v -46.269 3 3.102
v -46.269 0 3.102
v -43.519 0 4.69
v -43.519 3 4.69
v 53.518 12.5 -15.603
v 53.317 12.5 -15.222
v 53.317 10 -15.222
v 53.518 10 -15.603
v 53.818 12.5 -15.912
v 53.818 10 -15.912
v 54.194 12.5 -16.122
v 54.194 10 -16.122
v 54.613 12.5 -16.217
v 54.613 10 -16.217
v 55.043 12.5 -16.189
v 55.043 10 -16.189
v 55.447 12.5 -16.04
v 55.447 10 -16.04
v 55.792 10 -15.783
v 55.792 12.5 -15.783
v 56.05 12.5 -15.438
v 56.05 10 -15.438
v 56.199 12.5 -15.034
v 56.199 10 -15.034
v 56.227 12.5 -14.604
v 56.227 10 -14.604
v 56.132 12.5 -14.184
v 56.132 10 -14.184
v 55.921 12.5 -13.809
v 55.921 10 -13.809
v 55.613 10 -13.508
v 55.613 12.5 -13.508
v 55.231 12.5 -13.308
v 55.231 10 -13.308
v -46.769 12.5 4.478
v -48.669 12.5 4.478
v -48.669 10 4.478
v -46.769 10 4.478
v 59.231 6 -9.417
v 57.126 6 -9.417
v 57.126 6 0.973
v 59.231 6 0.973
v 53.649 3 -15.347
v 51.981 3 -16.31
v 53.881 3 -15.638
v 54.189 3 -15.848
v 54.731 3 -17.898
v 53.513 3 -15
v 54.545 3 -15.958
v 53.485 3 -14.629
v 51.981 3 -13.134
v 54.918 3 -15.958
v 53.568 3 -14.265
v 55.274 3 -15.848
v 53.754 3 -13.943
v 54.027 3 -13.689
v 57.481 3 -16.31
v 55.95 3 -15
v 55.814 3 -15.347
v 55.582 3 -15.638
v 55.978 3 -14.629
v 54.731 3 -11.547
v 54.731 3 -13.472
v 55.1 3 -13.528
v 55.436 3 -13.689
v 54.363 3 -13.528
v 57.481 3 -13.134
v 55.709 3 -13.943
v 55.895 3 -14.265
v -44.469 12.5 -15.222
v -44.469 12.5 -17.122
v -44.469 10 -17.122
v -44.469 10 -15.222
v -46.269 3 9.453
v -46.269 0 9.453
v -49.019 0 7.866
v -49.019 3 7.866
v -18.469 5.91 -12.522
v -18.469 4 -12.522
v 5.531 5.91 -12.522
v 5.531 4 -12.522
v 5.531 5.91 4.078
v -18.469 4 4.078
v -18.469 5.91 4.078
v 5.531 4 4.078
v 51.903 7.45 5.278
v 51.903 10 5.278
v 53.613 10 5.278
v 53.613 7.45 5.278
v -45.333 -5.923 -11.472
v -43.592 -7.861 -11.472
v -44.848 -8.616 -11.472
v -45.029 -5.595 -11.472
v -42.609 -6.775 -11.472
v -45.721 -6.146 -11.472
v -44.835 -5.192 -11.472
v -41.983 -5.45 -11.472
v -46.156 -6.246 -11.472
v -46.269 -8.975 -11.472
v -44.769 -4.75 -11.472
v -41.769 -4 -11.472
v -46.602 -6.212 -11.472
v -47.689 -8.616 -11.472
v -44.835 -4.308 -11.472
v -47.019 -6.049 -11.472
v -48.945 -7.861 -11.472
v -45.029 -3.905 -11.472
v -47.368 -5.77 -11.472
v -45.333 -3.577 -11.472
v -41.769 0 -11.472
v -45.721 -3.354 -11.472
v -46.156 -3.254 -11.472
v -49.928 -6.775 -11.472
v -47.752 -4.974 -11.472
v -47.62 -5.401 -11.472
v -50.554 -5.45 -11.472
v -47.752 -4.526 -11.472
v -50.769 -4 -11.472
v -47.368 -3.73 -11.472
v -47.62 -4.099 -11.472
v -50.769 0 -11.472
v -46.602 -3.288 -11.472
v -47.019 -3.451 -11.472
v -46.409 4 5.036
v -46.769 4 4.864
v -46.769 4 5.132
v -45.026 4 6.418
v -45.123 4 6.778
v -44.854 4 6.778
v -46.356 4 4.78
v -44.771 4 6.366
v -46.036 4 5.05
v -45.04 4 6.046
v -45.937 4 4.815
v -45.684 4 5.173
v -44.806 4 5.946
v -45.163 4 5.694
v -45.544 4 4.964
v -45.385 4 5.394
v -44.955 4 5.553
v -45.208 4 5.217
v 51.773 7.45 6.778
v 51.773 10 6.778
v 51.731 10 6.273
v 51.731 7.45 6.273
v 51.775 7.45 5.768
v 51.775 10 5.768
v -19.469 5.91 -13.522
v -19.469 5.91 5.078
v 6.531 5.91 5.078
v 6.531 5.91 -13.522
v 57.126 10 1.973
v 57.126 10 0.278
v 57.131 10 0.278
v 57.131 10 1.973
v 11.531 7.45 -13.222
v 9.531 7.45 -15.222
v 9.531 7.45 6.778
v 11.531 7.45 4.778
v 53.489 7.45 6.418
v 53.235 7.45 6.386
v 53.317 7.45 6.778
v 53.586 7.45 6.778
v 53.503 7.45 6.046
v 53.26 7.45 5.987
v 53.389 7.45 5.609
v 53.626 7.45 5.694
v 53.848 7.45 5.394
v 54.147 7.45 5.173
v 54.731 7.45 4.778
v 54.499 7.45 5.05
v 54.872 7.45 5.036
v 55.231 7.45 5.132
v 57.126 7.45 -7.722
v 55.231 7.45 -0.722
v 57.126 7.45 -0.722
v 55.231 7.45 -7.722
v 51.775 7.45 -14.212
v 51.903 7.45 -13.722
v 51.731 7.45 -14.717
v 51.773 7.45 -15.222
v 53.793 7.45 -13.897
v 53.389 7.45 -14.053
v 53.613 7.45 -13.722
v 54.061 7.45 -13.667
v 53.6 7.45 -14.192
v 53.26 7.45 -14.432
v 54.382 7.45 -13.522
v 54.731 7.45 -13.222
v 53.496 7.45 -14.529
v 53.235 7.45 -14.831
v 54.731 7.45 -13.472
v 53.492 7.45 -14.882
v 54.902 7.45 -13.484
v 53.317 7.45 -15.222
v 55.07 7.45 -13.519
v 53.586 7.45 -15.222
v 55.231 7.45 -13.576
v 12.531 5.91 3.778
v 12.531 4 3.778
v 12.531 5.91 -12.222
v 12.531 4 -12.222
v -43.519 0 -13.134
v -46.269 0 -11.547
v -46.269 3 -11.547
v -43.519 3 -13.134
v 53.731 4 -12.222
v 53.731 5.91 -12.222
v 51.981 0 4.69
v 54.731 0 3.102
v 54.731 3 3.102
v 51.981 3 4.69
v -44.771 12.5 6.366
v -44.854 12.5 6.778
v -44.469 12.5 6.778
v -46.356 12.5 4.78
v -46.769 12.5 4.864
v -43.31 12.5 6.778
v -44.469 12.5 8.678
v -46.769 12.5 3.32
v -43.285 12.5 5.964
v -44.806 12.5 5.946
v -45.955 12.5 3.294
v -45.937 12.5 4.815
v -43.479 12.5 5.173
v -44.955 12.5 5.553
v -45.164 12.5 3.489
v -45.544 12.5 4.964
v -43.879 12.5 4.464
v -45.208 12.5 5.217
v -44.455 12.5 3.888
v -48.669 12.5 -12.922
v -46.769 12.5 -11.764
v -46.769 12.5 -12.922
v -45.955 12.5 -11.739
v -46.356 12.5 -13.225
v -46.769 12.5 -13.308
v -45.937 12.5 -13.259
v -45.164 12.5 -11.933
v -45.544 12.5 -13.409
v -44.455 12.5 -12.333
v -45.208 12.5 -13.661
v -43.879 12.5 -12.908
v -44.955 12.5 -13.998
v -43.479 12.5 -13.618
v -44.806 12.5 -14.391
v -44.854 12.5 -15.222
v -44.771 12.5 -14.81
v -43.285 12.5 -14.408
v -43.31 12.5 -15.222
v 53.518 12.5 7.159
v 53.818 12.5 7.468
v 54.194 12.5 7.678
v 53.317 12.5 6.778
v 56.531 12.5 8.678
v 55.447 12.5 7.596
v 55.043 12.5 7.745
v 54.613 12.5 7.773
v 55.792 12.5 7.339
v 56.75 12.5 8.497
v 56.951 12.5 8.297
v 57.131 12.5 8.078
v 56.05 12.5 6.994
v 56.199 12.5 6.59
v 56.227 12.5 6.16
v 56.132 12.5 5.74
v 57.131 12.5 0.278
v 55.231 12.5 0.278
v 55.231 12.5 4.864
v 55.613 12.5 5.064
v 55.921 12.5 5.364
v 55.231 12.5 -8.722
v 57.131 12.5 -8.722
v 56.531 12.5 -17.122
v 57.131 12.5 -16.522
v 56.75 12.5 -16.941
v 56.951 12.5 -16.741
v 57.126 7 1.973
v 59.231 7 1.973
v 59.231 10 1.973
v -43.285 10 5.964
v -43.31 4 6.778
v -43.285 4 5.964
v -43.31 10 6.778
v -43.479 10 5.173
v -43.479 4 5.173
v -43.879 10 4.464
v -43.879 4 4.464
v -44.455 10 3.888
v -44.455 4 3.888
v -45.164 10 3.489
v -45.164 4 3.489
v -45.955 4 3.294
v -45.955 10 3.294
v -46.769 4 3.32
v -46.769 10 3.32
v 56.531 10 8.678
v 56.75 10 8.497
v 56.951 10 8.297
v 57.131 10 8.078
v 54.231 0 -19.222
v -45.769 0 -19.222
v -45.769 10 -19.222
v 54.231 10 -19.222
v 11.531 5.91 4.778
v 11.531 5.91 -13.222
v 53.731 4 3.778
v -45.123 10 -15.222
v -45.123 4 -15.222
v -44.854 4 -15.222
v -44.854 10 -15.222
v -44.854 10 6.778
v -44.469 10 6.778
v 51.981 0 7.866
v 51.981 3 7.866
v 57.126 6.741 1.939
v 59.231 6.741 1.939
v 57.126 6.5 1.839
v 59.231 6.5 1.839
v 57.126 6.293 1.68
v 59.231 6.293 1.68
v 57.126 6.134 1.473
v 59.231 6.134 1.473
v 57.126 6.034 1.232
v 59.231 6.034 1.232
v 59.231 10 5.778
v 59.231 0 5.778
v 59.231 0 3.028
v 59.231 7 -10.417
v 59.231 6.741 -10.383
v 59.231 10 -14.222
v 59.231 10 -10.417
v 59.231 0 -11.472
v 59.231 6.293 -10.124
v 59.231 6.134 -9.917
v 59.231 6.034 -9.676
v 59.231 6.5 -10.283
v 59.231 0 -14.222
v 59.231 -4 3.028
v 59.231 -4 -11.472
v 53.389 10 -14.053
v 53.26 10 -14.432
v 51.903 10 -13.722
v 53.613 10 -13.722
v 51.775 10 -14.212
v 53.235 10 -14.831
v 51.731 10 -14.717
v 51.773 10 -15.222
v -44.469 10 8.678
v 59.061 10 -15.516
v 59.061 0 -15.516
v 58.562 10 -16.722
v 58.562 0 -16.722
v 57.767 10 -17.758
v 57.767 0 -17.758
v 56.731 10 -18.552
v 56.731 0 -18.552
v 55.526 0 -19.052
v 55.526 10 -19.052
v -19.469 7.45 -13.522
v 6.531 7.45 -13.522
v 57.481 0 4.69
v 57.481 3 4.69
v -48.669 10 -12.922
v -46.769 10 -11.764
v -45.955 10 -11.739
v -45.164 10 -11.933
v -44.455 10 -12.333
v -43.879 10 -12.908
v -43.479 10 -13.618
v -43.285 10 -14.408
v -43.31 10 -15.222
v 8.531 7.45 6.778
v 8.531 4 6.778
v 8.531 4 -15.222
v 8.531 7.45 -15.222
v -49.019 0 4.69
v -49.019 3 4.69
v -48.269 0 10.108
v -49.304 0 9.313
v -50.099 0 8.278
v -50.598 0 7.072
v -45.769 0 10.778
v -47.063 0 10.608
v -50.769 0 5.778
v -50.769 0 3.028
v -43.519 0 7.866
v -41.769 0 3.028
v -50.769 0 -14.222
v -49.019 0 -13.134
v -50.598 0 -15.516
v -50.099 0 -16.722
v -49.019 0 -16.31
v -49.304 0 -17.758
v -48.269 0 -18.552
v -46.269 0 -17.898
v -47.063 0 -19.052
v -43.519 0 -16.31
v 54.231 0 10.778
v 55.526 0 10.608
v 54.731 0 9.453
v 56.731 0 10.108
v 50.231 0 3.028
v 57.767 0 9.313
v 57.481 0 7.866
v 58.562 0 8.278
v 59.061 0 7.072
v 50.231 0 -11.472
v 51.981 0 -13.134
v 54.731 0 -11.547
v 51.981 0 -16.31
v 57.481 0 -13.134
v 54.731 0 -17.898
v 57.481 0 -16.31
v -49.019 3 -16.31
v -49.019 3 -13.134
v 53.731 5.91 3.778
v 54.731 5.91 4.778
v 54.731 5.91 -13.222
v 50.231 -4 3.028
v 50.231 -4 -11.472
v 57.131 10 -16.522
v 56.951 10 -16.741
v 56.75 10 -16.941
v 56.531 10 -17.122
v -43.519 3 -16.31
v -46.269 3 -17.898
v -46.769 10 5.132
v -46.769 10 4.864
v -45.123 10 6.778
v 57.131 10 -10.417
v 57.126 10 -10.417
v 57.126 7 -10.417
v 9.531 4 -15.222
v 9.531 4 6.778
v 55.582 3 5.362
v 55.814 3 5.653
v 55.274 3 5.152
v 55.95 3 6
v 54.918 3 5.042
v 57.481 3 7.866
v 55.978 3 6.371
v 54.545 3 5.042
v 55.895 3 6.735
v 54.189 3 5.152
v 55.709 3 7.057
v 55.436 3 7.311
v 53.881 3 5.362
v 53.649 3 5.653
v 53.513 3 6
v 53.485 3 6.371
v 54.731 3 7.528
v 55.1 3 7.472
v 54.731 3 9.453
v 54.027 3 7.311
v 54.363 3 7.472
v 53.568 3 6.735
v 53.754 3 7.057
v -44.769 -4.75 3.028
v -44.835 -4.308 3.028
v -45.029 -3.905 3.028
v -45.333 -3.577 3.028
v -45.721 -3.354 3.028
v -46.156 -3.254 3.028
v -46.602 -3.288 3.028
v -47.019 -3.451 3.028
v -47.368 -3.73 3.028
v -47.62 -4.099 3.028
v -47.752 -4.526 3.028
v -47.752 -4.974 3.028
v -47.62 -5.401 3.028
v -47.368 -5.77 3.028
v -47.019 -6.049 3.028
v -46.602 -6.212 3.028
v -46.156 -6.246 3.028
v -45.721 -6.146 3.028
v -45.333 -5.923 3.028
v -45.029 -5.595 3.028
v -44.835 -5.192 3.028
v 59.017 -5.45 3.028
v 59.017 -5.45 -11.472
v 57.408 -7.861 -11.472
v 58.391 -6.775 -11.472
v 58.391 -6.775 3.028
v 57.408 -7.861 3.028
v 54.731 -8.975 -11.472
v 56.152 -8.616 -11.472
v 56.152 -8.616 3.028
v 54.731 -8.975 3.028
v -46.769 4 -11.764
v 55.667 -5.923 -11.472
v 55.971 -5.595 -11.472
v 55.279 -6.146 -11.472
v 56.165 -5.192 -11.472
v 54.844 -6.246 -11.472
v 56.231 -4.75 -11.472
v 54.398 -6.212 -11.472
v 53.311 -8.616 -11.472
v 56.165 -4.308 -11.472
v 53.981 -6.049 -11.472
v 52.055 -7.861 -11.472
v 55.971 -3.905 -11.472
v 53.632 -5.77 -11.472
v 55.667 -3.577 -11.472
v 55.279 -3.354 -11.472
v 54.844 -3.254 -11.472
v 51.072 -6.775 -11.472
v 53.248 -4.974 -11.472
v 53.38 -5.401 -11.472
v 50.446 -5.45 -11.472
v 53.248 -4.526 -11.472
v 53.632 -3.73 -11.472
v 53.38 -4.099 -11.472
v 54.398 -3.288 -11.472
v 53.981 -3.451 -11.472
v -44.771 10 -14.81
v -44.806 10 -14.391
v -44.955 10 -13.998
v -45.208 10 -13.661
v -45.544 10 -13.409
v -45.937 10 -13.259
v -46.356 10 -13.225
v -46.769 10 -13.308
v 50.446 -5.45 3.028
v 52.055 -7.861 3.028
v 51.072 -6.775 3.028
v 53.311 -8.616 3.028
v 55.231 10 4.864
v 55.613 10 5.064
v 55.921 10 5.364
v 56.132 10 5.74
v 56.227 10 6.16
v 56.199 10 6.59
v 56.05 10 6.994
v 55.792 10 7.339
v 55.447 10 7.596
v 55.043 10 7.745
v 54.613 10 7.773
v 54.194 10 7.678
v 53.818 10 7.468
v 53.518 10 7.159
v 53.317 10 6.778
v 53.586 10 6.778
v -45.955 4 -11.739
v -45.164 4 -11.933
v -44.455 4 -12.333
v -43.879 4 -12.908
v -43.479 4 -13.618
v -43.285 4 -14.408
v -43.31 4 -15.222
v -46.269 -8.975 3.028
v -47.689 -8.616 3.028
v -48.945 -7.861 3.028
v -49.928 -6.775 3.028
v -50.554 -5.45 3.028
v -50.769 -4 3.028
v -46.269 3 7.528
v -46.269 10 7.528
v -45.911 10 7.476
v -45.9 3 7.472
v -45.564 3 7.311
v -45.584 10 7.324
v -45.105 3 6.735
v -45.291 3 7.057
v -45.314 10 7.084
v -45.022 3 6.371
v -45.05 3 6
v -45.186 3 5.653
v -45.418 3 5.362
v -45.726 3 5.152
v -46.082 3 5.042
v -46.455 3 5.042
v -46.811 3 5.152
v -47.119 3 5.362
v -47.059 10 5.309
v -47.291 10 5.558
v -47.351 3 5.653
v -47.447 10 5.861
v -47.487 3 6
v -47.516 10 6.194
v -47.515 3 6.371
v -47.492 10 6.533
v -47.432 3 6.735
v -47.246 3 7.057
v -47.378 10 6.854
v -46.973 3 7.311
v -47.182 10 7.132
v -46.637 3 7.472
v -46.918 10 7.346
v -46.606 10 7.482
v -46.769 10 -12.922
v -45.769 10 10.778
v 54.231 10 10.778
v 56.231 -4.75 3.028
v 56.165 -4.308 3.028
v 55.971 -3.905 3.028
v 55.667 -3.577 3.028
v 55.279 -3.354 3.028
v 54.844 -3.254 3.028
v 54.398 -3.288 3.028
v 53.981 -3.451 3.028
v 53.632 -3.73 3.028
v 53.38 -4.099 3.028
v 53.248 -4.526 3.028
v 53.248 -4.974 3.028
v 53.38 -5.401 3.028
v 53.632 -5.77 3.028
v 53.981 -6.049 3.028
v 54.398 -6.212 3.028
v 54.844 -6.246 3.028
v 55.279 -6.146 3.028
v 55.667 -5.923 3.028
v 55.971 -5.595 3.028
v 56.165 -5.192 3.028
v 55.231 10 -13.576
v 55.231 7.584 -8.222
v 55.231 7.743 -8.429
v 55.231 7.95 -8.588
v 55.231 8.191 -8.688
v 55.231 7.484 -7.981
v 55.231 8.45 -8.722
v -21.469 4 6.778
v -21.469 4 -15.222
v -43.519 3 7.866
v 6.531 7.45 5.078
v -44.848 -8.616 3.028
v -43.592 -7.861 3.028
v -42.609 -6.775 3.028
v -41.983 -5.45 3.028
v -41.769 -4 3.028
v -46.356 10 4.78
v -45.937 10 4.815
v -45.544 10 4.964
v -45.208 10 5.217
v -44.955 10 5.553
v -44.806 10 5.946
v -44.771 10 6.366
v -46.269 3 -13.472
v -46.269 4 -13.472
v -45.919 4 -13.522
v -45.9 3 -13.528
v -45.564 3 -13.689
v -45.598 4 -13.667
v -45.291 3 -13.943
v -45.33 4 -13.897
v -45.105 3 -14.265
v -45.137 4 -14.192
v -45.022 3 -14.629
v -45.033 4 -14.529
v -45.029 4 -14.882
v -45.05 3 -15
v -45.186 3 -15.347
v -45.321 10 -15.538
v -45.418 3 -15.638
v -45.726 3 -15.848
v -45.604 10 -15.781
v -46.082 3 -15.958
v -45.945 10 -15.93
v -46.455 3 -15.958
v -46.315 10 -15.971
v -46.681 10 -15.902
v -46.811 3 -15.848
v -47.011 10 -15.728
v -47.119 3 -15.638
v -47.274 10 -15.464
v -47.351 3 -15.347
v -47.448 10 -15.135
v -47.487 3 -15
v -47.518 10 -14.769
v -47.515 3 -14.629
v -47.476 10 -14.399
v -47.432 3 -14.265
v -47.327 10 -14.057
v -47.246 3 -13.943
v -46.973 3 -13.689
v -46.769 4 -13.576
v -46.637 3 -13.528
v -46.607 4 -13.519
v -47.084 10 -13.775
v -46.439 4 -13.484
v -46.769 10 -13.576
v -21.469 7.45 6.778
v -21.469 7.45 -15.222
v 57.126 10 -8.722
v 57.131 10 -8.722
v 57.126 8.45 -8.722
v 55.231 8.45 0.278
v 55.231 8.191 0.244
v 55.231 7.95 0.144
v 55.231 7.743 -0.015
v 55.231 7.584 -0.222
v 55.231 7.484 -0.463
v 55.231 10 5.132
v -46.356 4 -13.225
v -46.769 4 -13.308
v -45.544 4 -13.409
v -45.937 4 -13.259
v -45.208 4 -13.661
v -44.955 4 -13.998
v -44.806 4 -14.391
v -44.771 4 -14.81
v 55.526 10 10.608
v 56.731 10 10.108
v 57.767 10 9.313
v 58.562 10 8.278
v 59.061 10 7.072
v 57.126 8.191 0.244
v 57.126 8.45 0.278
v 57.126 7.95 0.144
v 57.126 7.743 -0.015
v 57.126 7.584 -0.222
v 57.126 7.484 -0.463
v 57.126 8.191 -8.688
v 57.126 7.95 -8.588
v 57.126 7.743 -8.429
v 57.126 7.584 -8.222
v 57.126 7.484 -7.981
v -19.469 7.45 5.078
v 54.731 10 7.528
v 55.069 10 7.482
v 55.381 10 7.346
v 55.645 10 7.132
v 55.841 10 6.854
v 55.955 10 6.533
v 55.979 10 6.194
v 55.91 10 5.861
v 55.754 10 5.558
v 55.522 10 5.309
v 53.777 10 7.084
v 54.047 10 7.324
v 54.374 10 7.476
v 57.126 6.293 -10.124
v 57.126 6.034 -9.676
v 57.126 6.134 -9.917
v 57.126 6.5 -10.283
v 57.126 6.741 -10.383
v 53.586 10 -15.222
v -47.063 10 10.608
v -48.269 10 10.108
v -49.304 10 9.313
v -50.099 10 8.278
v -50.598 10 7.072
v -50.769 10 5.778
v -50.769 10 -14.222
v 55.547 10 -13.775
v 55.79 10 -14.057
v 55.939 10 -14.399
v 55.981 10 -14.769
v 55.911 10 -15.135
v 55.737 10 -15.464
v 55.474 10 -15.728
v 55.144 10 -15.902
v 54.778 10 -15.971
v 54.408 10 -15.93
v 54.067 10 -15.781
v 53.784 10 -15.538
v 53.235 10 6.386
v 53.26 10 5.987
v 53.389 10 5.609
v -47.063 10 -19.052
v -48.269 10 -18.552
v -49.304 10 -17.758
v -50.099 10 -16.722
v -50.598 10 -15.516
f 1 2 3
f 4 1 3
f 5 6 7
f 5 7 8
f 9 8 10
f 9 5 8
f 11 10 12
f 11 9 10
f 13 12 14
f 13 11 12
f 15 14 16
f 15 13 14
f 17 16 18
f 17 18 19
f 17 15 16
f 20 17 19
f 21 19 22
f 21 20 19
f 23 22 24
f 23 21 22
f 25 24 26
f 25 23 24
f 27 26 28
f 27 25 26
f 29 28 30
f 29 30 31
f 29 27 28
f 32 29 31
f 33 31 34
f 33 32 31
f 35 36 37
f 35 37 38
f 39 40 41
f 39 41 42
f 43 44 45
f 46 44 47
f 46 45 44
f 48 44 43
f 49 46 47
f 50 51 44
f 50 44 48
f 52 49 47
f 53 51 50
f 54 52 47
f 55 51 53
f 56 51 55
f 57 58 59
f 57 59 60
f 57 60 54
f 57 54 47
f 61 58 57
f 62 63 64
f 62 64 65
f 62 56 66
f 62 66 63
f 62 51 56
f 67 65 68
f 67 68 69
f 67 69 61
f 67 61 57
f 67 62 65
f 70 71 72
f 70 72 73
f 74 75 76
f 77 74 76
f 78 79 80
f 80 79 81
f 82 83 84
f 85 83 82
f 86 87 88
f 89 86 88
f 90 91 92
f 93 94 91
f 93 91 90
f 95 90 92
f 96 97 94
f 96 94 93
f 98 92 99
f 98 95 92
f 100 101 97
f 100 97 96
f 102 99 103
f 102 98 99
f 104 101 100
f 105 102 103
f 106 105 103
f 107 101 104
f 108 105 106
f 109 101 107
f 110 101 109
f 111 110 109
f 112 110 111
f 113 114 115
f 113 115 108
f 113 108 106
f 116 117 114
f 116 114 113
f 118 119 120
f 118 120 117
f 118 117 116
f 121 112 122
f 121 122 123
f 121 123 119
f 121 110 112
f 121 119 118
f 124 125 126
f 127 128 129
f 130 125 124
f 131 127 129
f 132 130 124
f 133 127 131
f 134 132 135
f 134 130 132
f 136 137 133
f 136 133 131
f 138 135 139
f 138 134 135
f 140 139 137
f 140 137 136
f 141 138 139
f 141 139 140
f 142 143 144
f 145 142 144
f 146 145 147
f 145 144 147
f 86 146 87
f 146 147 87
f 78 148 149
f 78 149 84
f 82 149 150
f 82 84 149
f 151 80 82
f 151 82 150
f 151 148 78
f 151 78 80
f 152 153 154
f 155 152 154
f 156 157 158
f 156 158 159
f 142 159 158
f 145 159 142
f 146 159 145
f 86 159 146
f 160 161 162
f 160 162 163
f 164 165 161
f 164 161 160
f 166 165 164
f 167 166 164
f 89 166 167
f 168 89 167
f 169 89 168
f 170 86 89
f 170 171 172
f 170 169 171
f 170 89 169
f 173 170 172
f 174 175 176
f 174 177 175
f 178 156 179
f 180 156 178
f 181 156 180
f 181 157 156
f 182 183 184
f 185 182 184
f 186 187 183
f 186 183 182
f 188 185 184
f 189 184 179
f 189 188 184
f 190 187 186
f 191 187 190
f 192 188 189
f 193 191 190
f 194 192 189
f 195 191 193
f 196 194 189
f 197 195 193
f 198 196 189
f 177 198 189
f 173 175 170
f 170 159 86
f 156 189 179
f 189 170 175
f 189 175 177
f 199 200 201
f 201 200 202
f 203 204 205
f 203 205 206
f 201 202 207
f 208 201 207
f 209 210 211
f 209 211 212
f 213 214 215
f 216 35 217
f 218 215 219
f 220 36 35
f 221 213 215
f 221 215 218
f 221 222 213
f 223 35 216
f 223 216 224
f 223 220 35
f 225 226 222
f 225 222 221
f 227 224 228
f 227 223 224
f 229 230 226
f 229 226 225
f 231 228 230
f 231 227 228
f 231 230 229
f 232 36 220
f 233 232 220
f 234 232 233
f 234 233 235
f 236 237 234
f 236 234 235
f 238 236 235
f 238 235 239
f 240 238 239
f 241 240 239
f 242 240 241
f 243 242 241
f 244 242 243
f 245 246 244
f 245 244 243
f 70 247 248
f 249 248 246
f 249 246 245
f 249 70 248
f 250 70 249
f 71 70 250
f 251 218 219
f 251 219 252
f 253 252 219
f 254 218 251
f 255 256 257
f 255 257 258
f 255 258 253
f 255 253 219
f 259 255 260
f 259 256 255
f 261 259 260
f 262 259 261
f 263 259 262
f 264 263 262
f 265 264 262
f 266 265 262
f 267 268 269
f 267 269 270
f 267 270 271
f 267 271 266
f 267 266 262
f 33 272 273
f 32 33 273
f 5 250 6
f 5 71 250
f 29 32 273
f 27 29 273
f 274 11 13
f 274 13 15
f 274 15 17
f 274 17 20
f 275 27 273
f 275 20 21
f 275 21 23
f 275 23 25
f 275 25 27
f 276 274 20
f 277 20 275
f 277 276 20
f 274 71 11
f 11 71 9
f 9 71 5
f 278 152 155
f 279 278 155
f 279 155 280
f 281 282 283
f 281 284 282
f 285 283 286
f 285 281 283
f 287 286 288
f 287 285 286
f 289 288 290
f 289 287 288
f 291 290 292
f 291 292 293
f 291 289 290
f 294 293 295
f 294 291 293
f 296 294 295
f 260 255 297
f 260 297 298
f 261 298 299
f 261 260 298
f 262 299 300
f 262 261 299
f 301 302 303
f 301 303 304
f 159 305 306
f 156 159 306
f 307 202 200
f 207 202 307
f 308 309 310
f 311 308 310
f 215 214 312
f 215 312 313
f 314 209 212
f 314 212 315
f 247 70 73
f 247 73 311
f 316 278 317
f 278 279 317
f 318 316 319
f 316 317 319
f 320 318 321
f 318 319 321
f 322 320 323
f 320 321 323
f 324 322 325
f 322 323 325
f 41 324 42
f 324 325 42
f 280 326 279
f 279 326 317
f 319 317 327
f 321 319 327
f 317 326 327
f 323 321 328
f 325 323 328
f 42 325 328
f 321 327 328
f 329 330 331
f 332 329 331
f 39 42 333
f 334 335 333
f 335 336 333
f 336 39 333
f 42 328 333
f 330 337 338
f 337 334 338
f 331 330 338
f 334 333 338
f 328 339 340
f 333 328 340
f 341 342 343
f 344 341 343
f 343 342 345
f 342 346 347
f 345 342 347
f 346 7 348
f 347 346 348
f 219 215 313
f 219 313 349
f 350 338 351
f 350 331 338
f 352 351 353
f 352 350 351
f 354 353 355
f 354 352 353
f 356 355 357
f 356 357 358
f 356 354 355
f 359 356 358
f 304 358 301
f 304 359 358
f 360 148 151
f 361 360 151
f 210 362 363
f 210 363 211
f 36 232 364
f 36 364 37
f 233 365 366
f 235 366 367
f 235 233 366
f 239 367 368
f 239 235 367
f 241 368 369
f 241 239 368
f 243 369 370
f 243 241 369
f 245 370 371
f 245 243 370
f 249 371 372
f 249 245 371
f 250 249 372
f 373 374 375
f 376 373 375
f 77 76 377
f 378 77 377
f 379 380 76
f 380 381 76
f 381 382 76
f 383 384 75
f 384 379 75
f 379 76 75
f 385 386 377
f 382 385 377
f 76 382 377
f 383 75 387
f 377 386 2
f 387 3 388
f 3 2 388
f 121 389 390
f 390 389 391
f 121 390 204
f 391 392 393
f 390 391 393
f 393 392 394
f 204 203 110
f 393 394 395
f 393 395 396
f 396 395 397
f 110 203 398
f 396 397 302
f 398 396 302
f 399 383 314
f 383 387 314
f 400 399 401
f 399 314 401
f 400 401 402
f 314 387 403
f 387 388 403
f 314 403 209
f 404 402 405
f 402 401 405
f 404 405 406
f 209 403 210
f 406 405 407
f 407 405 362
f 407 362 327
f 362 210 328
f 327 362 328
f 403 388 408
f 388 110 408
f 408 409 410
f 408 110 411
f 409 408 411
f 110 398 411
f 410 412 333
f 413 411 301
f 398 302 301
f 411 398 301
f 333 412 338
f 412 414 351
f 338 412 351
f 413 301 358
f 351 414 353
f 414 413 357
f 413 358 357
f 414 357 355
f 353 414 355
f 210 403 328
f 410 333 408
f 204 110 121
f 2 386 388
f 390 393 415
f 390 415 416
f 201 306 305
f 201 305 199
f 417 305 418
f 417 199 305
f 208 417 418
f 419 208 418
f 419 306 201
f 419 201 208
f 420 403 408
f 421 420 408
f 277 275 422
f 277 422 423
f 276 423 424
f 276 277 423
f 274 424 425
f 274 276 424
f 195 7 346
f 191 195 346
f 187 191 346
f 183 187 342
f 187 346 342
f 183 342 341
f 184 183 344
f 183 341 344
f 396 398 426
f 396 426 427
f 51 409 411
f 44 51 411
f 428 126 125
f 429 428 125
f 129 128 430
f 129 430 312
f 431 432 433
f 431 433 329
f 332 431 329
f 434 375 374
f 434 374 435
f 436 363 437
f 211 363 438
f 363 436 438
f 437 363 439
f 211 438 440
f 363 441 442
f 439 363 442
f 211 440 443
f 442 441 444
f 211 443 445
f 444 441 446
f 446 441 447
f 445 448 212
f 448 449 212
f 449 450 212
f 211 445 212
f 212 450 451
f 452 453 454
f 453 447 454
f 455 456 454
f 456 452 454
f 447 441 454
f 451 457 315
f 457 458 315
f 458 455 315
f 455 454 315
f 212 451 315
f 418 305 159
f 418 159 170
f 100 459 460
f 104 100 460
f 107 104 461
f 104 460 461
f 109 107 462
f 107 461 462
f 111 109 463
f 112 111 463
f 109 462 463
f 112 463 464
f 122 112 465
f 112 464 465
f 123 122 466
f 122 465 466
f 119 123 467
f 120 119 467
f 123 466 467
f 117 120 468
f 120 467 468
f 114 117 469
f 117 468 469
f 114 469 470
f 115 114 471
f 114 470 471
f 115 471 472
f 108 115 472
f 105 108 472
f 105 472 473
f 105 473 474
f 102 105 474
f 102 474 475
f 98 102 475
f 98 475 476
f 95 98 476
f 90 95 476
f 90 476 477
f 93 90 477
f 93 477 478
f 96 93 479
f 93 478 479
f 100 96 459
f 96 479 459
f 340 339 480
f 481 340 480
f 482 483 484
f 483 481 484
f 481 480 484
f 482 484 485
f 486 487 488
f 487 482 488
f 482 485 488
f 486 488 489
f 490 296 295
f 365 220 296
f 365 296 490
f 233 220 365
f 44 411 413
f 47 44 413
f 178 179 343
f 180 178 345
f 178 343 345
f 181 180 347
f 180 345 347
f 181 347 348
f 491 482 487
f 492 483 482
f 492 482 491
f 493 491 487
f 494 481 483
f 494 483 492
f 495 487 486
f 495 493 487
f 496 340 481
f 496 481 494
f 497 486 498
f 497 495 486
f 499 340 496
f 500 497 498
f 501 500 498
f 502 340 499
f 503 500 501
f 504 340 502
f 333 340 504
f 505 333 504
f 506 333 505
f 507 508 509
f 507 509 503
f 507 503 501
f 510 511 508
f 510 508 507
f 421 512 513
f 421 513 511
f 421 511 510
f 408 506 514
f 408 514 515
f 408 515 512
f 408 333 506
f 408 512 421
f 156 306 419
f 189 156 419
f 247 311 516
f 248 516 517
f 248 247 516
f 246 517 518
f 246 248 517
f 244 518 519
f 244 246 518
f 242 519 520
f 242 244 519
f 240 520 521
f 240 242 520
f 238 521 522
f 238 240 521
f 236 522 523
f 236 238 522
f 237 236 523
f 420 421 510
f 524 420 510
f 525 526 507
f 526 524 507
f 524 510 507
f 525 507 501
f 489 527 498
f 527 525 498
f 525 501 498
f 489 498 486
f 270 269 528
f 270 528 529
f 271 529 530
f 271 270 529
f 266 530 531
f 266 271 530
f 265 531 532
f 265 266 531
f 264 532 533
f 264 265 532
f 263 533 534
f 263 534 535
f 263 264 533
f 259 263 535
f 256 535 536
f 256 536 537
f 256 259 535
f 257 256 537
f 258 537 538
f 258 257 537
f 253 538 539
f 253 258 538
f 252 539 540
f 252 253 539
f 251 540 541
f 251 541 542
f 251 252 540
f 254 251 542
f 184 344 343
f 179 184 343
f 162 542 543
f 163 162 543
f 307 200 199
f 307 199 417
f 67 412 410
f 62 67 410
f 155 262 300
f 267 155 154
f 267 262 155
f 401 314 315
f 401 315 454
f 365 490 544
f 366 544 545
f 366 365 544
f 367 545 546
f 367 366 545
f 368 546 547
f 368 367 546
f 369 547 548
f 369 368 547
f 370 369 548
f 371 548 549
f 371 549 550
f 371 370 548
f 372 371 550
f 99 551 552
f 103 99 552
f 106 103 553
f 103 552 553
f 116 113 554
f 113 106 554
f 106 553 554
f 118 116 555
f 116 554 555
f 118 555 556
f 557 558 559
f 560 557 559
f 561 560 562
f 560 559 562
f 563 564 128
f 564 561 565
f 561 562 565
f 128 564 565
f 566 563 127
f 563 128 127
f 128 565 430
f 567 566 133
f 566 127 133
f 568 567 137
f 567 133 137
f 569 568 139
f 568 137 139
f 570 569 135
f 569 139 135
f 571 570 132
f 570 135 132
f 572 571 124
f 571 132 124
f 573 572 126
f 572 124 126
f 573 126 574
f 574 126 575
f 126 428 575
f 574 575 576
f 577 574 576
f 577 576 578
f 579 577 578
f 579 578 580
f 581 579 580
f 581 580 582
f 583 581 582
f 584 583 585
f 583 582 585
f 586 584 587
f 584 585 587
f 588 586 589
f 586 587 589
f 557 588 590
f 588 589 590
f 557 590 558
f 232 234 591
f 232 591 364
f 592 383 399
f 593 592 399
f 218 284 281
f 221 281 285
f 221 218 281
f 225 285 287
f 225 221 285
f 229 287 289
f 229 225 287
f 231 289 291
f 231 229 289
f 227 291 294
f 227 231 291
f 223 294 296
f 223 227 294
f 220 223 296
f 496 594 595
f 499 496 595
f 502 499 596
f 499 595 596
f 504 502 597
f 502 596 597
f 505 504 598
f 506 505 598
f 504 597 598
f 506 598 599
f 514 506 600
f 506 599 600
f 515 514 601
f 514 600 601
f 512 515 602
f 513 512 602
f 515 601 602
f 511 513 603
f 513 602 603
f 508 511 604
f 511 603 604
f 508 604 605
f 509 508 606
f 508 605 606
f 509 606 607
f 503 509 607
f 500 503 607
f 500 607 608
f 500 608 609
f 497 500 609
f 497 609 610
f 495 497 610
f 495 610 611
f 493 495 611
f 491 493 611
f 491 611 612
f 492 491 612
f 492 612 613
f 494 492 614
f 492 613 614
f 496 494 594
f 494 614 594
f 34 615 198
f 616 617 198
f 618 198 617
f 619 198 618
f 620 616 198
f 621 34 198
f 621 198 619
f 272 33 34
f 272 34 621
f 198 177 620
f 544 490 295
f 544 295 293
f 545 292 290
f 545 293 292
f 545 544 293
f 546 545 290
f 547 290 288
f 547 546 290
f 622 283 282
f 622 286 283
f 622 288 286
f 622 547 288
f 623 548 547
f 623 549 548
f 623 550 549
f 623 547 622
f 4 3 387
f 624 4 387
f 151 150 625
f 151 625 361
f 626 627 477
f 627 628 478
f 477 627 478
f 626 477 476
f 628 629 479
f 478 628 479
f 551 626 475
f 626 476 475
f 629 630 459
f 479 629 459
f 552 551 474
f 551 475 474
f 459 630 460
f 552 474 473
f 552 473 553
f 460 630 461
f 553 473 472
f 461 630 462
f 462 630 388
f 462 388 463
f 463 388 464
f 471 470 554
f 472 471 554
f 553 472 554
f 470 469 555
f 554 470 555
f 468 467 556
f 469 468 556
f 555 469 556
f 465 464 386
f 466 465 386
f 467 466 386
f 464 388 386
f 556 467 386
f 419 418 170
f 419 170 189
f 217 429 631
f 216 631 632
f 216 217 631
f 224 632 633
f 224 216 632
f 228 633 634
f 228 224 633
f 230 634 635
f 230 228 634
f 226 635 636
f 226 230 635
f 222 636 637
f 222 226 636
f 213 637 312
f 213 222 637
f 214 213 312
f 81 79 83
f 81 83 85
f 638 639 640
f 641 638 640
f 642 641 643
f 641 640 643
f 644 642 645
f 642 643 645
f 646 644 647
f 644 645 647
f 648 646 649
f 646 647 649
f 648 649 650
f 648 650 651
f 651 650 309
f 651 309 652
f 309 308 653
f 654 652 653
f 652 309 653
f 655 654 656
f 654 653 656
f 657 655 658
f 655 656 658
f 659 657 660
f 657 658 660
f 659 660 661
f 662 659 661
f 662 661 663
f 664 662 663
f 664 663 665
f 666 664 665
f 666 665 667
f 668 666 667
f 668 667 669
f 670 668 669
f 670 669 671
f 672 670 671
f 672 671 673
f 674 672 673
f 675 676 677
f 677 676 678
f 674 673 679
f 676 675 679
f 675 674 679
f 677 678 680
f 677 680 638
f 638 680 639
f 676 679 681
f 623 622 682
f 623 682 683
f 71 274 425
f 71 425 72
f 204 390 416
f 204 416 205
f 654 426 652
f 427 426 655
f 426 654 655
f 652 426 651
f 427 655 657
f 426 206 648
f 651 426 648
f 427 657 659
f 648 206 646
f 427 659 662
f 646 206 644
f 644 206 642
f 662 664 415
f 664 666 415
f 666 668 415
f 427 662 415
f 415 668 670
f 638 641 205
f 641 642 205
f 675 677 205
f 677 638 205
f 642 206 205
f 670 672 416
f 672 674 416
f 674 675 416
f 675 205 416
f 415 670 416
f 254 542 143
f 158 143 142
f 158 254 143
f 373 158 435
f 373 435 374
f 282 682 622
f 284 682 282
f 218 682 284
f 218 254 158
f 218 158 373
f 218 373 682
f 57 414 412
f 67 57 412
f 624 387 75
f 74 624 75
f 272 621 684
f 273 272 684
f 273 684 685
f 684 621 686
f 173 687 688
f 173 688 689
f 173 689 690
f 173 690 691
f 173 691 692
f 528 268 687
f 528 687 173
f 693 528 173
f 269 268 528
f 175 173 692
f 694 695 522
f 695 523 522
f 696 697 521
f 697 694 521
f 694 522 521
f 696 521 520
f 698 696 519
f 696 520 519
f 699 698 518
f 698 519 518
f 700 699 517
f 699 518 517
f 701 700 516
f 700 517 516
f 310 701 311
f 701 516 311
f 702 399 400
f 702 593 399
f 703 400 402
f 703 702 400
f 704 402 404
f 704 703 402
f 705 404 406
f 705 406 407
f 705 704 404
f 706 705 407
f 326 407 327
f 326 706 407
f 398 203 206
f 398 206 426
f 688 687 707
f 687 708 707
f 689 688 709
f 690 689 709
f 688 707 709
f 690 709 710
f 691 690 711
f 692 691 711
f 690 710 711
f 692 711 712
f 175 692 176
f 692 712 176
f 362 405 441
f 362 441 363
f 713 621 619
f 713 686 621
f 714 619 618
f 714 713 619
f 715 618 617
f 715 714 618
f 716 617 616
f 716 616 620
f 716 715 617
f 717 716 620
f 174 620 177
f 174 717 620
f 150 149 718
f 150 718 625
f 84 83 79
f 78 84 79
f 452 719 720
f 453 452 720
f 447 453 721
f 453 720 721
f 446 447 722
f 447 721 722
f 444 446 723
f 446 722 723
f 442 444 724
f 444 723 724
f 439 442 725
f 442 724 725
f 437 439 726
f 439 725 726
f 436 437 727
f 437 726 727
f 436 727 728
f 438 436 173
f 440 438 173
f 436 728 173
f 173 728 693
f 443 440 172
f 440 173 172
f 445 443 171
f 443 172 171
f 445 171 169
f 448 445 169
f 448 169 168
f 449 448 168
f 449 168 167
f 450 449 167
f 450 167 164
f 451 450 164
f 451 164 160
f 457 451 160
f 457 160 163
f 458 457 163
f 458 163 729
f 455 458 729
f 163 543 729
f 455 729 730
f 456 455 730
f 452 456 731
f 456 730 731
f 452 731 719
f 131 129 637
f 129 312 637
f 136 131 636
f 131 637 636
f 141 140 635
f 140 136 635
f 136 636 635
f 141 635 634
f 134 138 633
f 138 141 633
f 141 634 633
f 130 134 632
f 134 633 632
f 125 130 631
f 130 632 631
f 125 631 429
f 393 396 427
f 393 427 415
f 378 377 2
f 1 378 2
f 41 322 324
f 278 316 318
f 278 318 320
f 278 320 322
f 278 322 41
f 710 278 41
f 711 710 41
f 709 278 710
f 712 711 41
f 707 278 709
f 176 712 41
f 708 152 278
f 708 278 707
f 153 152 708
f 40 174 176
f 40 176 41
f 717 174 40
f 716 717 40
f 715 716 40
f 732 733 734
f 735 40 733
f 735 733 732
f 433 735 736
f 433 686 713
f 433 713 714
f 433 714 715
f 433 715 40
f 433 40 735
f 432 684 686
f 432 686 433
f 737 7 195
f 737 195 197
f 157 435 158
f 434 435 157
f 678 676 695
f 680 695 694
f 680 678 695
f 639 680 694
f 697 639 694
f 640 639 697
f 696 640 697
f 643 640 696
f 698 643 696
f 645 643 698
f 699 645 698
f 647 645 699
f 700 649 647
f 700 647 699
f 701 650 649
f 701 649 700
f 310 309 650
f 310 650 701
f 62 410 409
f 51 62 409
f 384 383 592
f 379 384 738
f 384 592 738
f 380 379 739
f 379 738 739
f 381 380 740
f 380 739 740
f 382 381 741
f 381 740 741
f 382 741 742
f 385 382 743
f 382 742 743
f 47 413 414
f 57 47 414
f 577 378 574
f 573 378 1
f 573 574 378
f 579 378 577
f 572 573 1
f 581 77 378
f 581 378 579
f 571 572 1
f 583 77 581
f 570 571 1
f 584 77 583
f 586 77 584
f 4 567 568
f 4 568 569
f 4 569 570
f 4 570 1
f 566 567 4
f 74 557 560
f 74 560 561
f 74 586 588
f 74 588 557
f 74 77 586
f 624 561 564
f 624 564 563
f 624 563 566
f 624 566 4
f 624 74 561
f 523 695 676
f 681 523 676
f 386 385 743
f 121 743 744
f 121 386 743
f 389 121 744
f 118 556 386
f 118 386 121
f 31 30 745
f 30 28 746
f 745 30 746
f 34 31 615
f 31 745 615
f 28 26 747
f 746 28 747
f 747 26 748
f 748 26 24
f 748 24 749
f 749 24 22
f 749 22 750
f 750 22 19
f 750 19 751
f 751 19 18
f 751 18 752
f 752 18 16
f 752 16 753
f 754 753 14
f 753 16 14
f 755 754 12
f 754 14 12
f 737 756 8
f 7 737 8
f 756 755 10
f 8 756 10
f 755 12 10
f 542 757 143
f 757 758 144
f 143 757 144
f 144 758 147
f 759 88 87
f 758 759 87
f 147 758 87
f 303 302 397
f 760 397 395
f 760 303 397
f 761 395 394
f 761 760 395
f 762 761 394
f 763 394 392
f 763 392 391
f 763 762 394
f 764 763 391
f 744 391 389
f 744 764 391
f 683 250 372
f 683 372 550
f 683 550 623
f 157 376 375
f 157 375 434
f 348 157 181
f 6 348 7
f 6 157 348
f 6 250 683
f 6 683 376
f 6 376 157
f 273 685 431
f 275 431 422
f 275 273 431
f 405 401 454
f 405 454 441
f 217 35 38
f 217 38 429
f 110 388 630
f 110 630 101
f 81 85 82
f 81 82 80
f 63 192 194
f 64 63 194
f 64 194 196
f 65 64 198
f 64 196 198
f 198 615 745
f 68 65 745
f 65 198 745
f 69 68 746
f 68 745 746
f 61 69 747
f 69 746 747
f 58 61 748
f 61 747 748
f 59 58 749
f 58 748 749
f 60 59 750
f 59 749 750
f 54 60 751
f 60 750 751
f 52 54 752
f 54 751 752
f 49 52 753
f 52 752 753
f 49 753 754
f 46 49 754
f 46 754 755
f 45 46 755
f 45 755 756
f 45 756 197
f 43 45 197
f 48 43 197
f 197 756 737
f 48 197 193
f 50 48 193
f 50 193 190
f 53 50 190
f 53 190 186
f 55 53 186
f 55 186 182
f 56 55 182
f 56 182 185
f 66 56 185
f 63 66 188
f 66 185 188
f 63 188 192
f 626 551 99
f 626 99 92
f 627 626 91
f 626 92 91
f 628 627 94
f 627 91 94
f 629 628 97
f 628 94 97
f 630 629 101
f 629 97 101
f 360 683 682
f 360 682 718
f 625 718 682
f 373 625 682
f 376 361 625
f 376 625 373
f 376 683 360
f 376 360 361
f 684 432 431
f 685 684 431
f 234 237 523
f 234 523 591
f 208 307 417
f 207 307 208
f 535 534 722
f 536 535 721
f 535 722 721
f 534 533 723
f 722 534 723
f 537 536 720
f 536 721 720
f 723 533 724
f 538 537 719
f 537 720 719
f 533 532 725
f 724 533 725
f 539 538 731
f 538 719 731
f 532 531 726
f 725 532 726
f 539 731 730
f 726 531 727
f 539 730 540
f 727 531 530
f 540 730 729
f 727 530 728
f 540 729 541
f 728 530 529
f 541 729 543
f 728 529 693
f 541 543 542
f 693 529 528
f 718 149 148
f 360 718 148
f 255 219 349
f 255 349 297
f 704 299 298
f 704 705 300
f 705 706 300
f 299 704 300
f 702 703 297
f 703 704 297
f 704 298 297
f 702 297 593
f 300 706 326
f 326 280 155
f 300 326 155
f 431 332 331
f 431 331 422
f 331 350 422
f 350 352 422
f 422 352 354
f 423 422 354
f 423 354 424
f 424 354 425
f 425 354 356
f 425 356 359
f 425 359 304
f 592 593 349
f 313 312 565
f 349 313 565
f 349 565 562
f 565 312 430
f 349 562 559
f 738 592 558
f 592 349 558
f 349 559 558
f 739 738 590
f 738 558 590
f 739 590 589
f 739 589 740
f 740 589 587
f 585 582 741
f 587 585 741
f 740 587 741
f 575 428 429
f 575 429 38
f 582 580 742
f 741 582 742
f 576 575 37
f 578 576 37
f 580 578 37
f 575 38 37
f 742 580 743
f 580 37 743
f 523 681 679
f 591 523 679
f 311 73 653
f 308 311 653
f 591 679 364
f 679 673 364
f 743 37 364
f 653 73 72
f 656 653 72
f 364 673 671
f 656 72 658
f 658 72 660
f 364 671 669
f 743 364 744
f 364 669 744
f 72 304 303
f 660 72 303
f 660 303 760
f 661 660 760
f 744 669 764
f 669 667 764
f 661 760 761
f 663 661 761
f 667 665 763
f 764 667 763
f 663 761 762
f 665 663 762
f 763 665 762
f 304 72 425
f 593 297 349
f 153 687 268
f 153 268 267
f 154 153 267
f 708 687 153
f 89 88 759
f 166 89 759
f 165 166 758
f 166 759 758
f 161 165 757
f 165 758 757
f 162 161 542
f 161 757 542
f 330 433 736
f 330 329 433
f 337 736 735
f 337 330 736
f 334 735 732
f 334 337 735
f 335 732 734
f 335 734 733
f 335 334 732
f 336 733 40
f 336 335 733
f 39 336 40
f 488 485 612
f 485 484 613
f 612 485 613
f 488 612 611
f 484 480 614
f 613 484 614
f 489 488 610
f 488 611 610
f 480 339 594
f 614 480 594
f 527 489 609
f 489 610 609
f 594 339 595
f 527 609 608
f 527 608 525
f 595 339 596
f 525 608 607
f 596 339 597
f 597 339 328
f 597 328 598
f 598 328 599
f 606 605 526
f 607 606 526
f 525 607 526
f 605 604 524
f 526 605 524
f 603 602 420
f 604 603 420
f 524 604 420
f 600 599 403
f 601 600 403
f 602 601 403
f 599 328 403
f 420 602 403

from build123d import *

# Parameters (mm, degrees)
SKETCH1_W           = 110
SKETCH1_H           = 30
BOSS_EXTRUDE1_DEPTH = 10
SHELL1_T            = -4
SKETCH2_W           = 30
SKETCH2_H           = 22.6
SKETCH2_W_2         = 26
SKETCH2_H_2         = 18.6
SKETCH2_W_3         = 47.2
SKETCH2_H_3         = 22
SKETCH2_W_4         = 43.2
SKETCH2_H_4         = 18
BOSS_EXTRUDE2_DEPTH = 3.45
SKETCH3_W           = 26
SKETCH3_H           = 18.6
SKETCH3_W_2         = 24
SKETCH3_H_2         = 16.6
SKETCH3_W_3         = 43.2
SKETCH3_H_3         = 18
SKETCH3_W_4         = 41.2
SKETCH3_H_4         = 16
BOSS_EXTRUDE3_DEPTH = 1.91
BOSS_EXTRUDE4_REACH = 65.07
SKETCH4_R           = 3
SKETCH4_R_2         = 1.5
CUT_EXTRUDE4_REACH  = 65.07
SKETCH5_R           = 1.25
BOSS_EXTRUDE5_START = 2.5
BOSS_EXTRUDE5_DEPTH = 2.5
CUT_EXTRUDE7_DEPTH  = 3
CUT_EXTRUDE8_START  = -5.05
SKETCH9_W           = 11.612420809
SKETCH9_H           = 9
CUT_EXTRUDE8_DEPTH  = 5.05
SKETCH10_W          = 2.105051461
SKETCH10_H          = 12.390469158
CUT_EXTRUDE9_DEPTH  = 4
FILLET1_R           = 5
FILLET2_R           = 1
SKETCH11_W          = 9
SKETCH11_H          = 14.5
BOSS_EXTRUDE6_DEPTH = 9
SKETCH12_R          = 1.5
CUT_EXTRUDE10_DEPTH = 14.5
FILLET3_R           = 5


with BuildPart() as part:
    # Sketch1 → Boss-Extrude1 (new body)
    with BuildSketch(Plane(origin=(0, 0, 0), x_dir=(1, 0, 0), z_dir=(0, 1, 0))):
        with Locations((4.231484391, 4.222107765)):
            Rectangle(SKETCH1_W, SKETCH1_H)
    extrude(amount=BOSS_EXTRUDE1_DEPTH)

    # Shell1
    shell1_openings = [part.faces().sort_by_distance(p)[0] for p in [
        (4.231484391, 10, -4.222107765),
    ]]
    offset(amount=SHELL1_T, openings=shell1_openings, kind=Kind.INTERSECTION)

    # Sketch2 → Boss-Extrude2 (add)
    # profile 1 of 2: a face of its own
    with BuildSketch(Plane(origin=(0, 4, 0), x_dir=(1, 0, 0), z_dir=(0, 1, 0))):
        with Locations((-6.468515609, 4.222107765)):
            Rectangle(SKETCH2_W, SKETCH2_H)
        with Locations((-6.468515609, 4.222107765)):
            Rectangle(SKETCH2_W_2, SKETCH2_H_2, mode=Mode.SUBTRACT)
    # profile 2 of 2: a face of its own
    with BuildSketch(Plane(origin=(0, 4, 0), x_dir=(1, 0, 0), z_dir=(0, 1, 0))):
        with Locations((33.131484391, 4.222107765)):
            Rectangle(SKETCH2_W_3, SKETCH2_H_3)
        with Locations((33.131484391, 4.222107765)):
            Rectangle(SKETCH2_W_4, SKETCH2_H_4, mode=Mode.SUBTRACT)
    extrude(amount=BOSS_EXTRUDE2_DEPTH)

    # Sketch3 → Boss-Extrude3 (add)
    # profile 1 of 2: a face of its own
    with BuildSketch(Plane(origin=(0, 4, 0), x_dir=(1, 0, 0), z_dir=(0, 1, 0))):
        with Locations((-6.468515609, 4.222107765)):
            Rectangle(SKETCH3_W, SKETCH3_H)
        with Locations((-6.468515609, 4.222107765)):
            Rectangle(SKETCH3_W_2, SKETCH3_H_2, mode=Mode.SUBTRACT)
    # profile 2 of 2: a face of its own
    with BuildSketch(Plane(origin=(0, 4, 0), x_dir=(1, 0, 0), z_dir=(0, 1, 0))):
        with Locations((33.131484391, 4.222107765)):
            Rectangle(SKETCH3_W_3, SKETCH3_H_3)
        with Locations((33.131484391, 4.222107765)):
            Rectangle(SKETCH3_W_4, SKETCH3_H_4, mode=Mode.SUBTRACT)
    extrude(amount=BOSS_EXTRUDE3_DEPTH)

    # Boss-Extrude4: up to this face of the body (flat: up to its plane)
    boss_extrude4_end = Plane(part.part.faces().sort_by_distance((-34.118515609, 4, -4.222107765))[0])
    # Sketch4 → Boss-Extrude4 (add, up to the picked face)
    with BuildSketch(Plane(origin=(0, 10, 0), x_dir=(1, 0, 0), z_dir=(0, 1, 0)), mode=Mode.PRIVATE) as boss_extrude4_sk1:
        with Locations((-46.268515609, -6.277892235)):
            Circle(SKETCH4_R)
        with Locations((-46.268515609, -6.277892235)):
            Circle(SKETCH4_R_2, mode=Mode.SUBTRACT)
    boss_extrude4_tool1 = split(extrude(boss_extrude4_sk1.sketch, amount=-BOSS_EXTRUDE4_REACH, mode=Mode.PRIVATE), bisect_by=boss_extrude4_end, keep=Keep.BOTH, mode=Mode.PRIVATE)
    # Sketch4 → Boss-Extrude4 (add, up to the picked face)
    with BuildSketch(Plane(origin=(0, 10, 0), x_dir=(1, 0, 0), z_dir=(0, 1, 0)), mode=Mode.PRIVATE) as boss_extrude4_sk2:
        with Locations((-46.268515609, 14.722107765)):
            Circle(SKETCH4_R)
        with Locations((-46.268515609, 14.722107765)):
            Circle(SKETCH4_R_2, mode=Mode.SUBTRACT)
    boss_extrude4_tool2 = split(extrude(boss_extrude4_sk2.sketch, amount=-BOSS_EXTRUDE4_REACH, mode=Mode.PRIVATE), bisect_by=boss_extrude4_end, keep=Keep.BOTH, mode=Mode.PRIVATE)
    # Sketch4 → Boss-Extrude4 (add, up to the picked face)
    with BuildSketch(Plane(origin=(0, 10, 0), x_dir=(1, 0, 0), z_dir=(0, 1, 0)), mode=Mode.PRIVATE) as boss_extrude4_sk3:
        with BuildLine():
            Line((55.231484391, 11.764067874), (55.231484391, 13.307894203))
            ThreePointArc((55.231484391, 13.307894203), (55.103485361, 16.175247565), (53.613450402, 13.722107765))
            Line((53.613450402, 13.722107765), (51.903057266, 13.722107765))
            ThreePointArc((51.903057266, 13.722107765), (56.252626486, 17.307862341), (55.231484391, 11.764067874))
        make_face()
    boss_extrude4_tool3 = split(extrude(boss_extrude4_sk3.sketch, amount=-BOSS_EXTRUDE4_REACH, mode=Mode.PRIVATE), bisect_by=boss_extrude4_end, keep=Keep.BOTH, mode=Mode.PRIVATE)
    # Sketch4 → Boss-Extrude4 (add, up to the picked face)
    with BuildSketch(Plane(origin=(0, 10, 0), x_dir=(1, 0, 0), z_dir=(0, 1, 0)), mode=Mode.PRIVATE) as boss_extrude4_sk4:
        with BuildLine():
            Line((51.903057266, -5.277892235), (53.613450402, -5.277892235))
            ThreePointArc((53.613450402, -5.277892235), (55.103485361, -7.731032035), (55.231484391, -4.863678672))
            Line((55.231484391, -4.863678672), (55.231484391, -3.319852343))
            ThreePointArc((55.231484391, -3.319852343), (56.252626486, -8.86364681), (51.903057266, -5.277892235))
        make_face()
    boss_extrude4_tool4 = split(extrude(boss_extrude4_sk4.sketch, amount=-BOSS_EXTRUDE4_REACH, mode=Mode.PRIVATE), bisect_by=boss_extrude4_end, keep=Keep.BOTH, mode=Mode.PRIVATE)
    add(boss_extrude4_tool1.solids().sort_by(Axis((-49.183663, 10, 6.277892), (0, -1, 0)))[0])
    add(boss_extrude4_tool2.solids().sort_by(Axis((-49.183663, 10, -14.722108), (0, -1, 0)))[0])
    add(boss_extrude4_tool3.solids().sort_by(Axis((56.209752, 10, -17.234981), (0, -1, 0)))[0])
    add(boss_extrude4_tool4.solids().sort_by(Axis((52.758254, 10, 5.362449), (0, -1, 0)))[0])

    # Cut-Extrude4: up to this face of the body (flat: up to its plane)
    cut_extrude4_end = Plane(part.part.faces().sort_by_distance((4.231484391, 0, -4.222107765))[0])
    # Sketch5 → Cut-Extrude4 (cut, up to the picked face)
    with BuildSketch(Plane(origin=(0, 10, 0), x_dir=(1, 0, 0), z_dir=(0, 1, 0)), mode=Mode.PRIVATE) as cut_extrude4_sk1:
        with Locations(Location((-46.268515609, 14.722107765, 0), (0, 0, 270))):
            Circle(SKETCH5_R)
    cut_extrude4_tool1 = split(extrude(cut_extrude4_sk1.sketch, amount=-CUT_EXTRUDE4_REACH, mode=Mode.PRIVATE), bisect_by=cut_extrude4_end, keep=Keep.BOTH, mode=Mode.PRIVATE)
    # Sketch5 → Cut-Extrude4 (cut, up to the picked face)
    with BuildSketch(Plane(origin=(0, 10, 0), x_dir=(1, 0, 0), z_dir=(0, 1, 0)), mode=Mode.PRIVATE) as cut_extrude4_sk2:
        with Locations(Location((-46.268515609, -6.277892235, 0), (0, 0, 270))):
            Circle(SKETCH5_R)
    cut_extrude4_tool2 = split(extrude(cut_extrude4_sk2.sketch, amount=-CUT_EXTRUDE4_REACH, mode=Mode.PRIVATE), bisect_by=cut_extrude4_end, keep=Keep.BOTH, mode=Mode.PRIVATE)
    # Sketch5 → Cut-Extrude4 (cut, up to the picked face)
    with BuildSketch(Plane(origin=(0, 10, 0), x_dir=(1, 0, 0), z_dir=(0, 1, 0)), mode=Mode.PRIVATE) as cut_extrude4_sk3:
        with Locations(Location((54.731484391, -6.277892235, 0), (0, 0, 270))):
            Circle(SKETCH5_R)
    cut_extrude4_tool3 = split(extrude(cut_extrude4_sk3.sketch, amount=-CUT_EXTRUDE4_REACH, mode=Mode.PRIVATE), bisect_by=cut_extrude4_end, keep=Keep.BOTH, mode=Mode.PRIVATE)
    # Sketch5 → Cut-Extrude4 (cut, up to the picked face)
    with BuildSketch(Plane(origin=(0, 10, 0), x_dir=(1, 0, 0), z_dir=(0, 1, 0)), mode=Mode.PRIVATE) as cut_extrude4_sk4:
        with Locations(Location((54.731484391, 14.722107765, 0), (0, 0, 270))):
            Circle(SKETCH5_R)
    cut_extrude4_tool4 = split(extrude(cut_extrude4_sk4.sketch, amount=-CUT_EXTRUDE4_REACH, mode=Mode.PRIVATE), bisect_by=cut_extrude4_end, keep=Keep.BOTH, mode=Mode.PRIVATE)
    add(cut_extrude4_tool1.solids().sort_by(Axis((-46.268516, 10, -14.722108), (0, -1, 0)))[0], mode=Mode.SUBTRACT)
    add(cut_extrude4_tool2.solids().sort_by(Axis((-46.268516, 10, 6.277892), (0, -1, 0)))[0], mode=Mode.SUBTRACT)
    add(cut_extrude4_tool3.solids().sort_by(Axis((54.731484, 10, 6.277892), (0, -1, 0)))[0], mode=Mode.SUBTRACT)
    add(cut_extrude4_tool4.solids().sort_by(Axis((54.731484, 10, -14.722108), (0, -1, 0)))[0], mode=Mode.SUBTRACT)

    # Sketch7 → Boss-Extrude5 (add)
    with BuildSketch(Plane(origin=(0, 10, 0), x_dir=(1, 0, 0), z_dir=(0, 1, 0)).offset(BOSS_EXTRUDE5_START)):
        with BuildLine():
            ThreePointArc((-44.854302047, 15.222107765), (-45.207855437, 13.661447594), (-46.768515609, 13.307894203))
            Line((-46.768515609, 13.307894203), (-46.768515609, 12.922107765))
            Line((-46.768515609, 12.922107765), (-48.668515609, 12.922107765))
            Line((-48.668515609, 12.922107765), (-48.668515609, -3.319852343))
            Line((-48.668515609, -3.319852343), (-48.668515609, -4.477892235))
            Line((-48.668515609, -4.477892235), (-46.768515609, -4.477892235))
            Line((-46.768515609, -4.477892235), (-46.768515609, -4.863678672))
            ThreePointArc((-46.768515609, -4.863678672), (-45.207855437, -5.217232063), (-44.854302047, -6.777892235))
            Line((-44.854302047, -6.777892235), (-44.468515609, -6.777892235))
            Line((-44.468515609, -6.777892235), (-44.468515609, -8.677892235))
            Line((-44.468515609, -8.677892235), (-43.310475718, -8.677892235))
            Line((-43.310475718, -8.677892235), (51.773444499, -8.677892235))
            Line((51.773444499, -8.677892235), (52.931484391, -8.677892235))
            Line((52.931484391, -8.677892235), (56.531484391, -8.677892235))
            ThreePointArc((56.531484391, -8.677892235), (56.852804734, -8.399212578), (57.131484391, -8.077892235))
            Line((57.131484391, -8.077892235), (57.131484391, -5.132248311))
            Line((57.131484391, -5.132248311), (57.131484391, 13.576463842))
            Line((57.131484391, 13.576463842), (57.131484391, 16.522107765))
            ThreePointArc((57.131484391, 16.522107765), (56.852804734, 16.843428109), (56.531484391, 17.122107765))
            Line((56.531484391, 17.122107765), (51.773444499, 17.122107765))
            Line((51.773444499, 17.122107765), (-44.468515609, 17.122107765))
            Line((-44.468515609, 17.122107765), (-44.468515609, 15.222107765))
            Line((-44.468515609, 15.222107765), (-44.854302047, 15.222107765))
        make_face()
        with BuildLine():
            Line((53.317270829, -6.777892235), (51.773444499, -6.777892235))
            Line((51.773444499, -6.777892235), (-43.310475718, -6.777892235))
            ThreePointArc((-43.310475718, -6.777892235), (-44.147195266, -4.156571891), (-46.768515609, -3.319852343))
            Line((-46.768515609, -3.319852343), (-46.768515609, 11.764067874))
            ThreePointArc((-46.768515609, 11.764067874), (-44.147195266, 12.600787422), (-43.310475718, 15.222107765))
            Line((-43.310475718, 15.222107765), (51.773444499, 15.222107765))
            Line((51.773444499, 15.222107765), (53.317270829, 15.222107765))
            ThreePointArc((53.317270829, 15.222107765), (55.792144563, 15.782767937), (55.231484391, 13.307894203))
            Line((55.231484391, 13.307894203), (55.231484391, -4.863678672))
            ThreePointArc((55.231484391, -4.863678672), (55.792144563, -7.338552406), (53.317270829, -6.777892235))
        make_face(mode=Mode.SUBTRACT)
    extrude(amount=-BOSS_EXTRUDE5_DEPTH)

    # Sketch8 → Cut-Extrude7 (cut)
    with BuildSketch(Plane.XZ):
        Polygon((-43.518515609, -13.134394525), (-43.518515609, -16.309821006), (-46.268515609, -17.897534246), (-49.018515609, -16.309821006), (-49.018515609, -13.134394525), (-46.268515609, -11.546681285), align=None)
        Polygon((-43.518515609, 7.865605475), (-46.268515609, 9.453318715), (-49.018515609, 7.865605475), (-49.018515609, 4.690178994), (-46.268515609, 3.102465754), (-43.518515609, 4.690178994), align=None)
        Polygon((51.981484391, -16.309821006), (54.731484391, -17.897534246), (57.481484391, -16.309821006), (57.481484391, -13.134394525), (54.731484391, -11.546681285), (51.981484391, -13.134394525), align=None)
        Polygon((51.981484391, 4.690178994), (51.981484391, 7.865605475), (54.731484391, 9.453318715), (57.481484391, 7.865605475), (57.481484391, 4.690178994), (54.731484391, 3.102465754), align=None)
    extrude(amount=-CUT_EXTRUDE7_DEPTH, mode=Mode.SUBTRACT)

    # Sketch9 → Cut-Extrude8 (cut)
    with BuildSketch(Plane(origin=(0, 12.5, 0), x_dir=(1, 0, 0), z_dir=(0, 1, 0)).offset(CUT_EXTRUDE8_START)):
        with Locations((57.937694796, 4.222107765)):
            Rectangle(SKETCH9_W, SKETCH9_H)
    extrude(amount=CUT_EXTRUDE8_DEPTH, mode=Mode.SUBTRACT)

    # Sketch10 → Cut-Extrude9 (cut)
    with BuildSketch(Plane(origin=(0, 10, 0), x_dir=(1, 0, 0), z_dir=(0, 1, 0))):
        with Locations((58.178958661, 4.222107765)):
            Rectangle(SKETCH10_W, SKETCH10_H)
    extrude(amount=-CUT_EXTRUDE9_DEPTH, mode=Mode.SUBTRACT)

    # Fillet1
    fillet1_edges = [part.edges().sort_by_distance(p)[0] for p in [
        (-50.768515609, 5, -19.222107765),
        (59.231484391, 5, -19.222107765),
        (59.231484391, 5, 10.777892235),
        (-50.768515609, 5, 10.777892235),
    ]]
    fillet(fillet1_edges, radius=FILLET1_R)

    # Fillet2
    fillet2_edges = [part.edges().sort_by_distance(p)[0] for p in [
        (56.178958661, 7.45, 0.277892235),
        (56.178958661, 7.45, -8.722107765),
        (58.178958661, 6, 1.973126814),
        (58.178958661, 6, -10.417342344),
    ]]
    fillet(fillet2_edges, radius=FILLET2_R)

    # Sketch11 → Boss-Extrude6 (add)
    with BuildSketch(Plane(origin=(0, 0, 0), x_dir=(-1, 0, 0), z_dir=(0, -1, 0))):
        with Locations((-54.731484391, 4.222107765)):
            Rectangle(SKETCH11_W, SKETCH11_H)
        with Locations((46.268515609, 4.222107765)):
            Rectangle(SKETCH11_W, SKETCH11_H)
    extrude(amount=BOSS_EXTRUDE6_DEPTH)

    # Sketch12 → Cut-Extrude10 (cut)
    with BuildSketch(Plane.XY.offset(3.027892235)):
        with Locations((54.731484391, -4.75)):
            Circle(SKETCH12_R)
        with Locations((-46.268515609, -4.75)):
            Circle(SKETCH12_R)
    extrude(amount=-CUT_EXTRUDE10_DEPTH, mode=Mode.SUBTRACT)

    # Fillet3
    # the kernel refuses this fillet: 5 mm, written as the material it takes off along each edge
    with BuildSketch(Plane(origin=(-50.768515609, -9, 15.527892235), x_dir=(0, 1, 0), z_dir=(0, 0, -1)), Plane(origin=(50.231484391, -9, -23.972107765), x_dir=(1, 0, 0), z_dir=(0, 0, 1)), Plane(origin=(-41.768515609, -9, -23.972107765), x_dir=(0, 1, 0), z_dir=(0, 0, 1))) as fillet3_piece_1:
        with BuildLine():
            CenterArc((FILLET3_R, FILLET3_R), FILLET3_R, 180, 90)
            Line((0, FILLET3_R), (0, 0))
            Line((0, 0), (FILLET3_R, 0))
        make_face()
    extrude(amount=39.5, mode=Mode.SUBTRACT)
    with BuildSketch(Plane(origin=(59.231484391, -9, 15.527892235), x_dir=(0, 1, 0), z_dir=(0, 0, -1))) as fillet3_piece_2:
        with BuildLine():
            CenterArc((FILLET3_R, -FILLET3_R), FILLET3_R, 90, 90)
            Line((0, -FILLET3_R), (0, 0))
            Line((0, 0), (FILLET3_R, 0))
        make_face()
    extrude(amount=39.5, mode=Mode.SUBTRACT)


solid = part.part
